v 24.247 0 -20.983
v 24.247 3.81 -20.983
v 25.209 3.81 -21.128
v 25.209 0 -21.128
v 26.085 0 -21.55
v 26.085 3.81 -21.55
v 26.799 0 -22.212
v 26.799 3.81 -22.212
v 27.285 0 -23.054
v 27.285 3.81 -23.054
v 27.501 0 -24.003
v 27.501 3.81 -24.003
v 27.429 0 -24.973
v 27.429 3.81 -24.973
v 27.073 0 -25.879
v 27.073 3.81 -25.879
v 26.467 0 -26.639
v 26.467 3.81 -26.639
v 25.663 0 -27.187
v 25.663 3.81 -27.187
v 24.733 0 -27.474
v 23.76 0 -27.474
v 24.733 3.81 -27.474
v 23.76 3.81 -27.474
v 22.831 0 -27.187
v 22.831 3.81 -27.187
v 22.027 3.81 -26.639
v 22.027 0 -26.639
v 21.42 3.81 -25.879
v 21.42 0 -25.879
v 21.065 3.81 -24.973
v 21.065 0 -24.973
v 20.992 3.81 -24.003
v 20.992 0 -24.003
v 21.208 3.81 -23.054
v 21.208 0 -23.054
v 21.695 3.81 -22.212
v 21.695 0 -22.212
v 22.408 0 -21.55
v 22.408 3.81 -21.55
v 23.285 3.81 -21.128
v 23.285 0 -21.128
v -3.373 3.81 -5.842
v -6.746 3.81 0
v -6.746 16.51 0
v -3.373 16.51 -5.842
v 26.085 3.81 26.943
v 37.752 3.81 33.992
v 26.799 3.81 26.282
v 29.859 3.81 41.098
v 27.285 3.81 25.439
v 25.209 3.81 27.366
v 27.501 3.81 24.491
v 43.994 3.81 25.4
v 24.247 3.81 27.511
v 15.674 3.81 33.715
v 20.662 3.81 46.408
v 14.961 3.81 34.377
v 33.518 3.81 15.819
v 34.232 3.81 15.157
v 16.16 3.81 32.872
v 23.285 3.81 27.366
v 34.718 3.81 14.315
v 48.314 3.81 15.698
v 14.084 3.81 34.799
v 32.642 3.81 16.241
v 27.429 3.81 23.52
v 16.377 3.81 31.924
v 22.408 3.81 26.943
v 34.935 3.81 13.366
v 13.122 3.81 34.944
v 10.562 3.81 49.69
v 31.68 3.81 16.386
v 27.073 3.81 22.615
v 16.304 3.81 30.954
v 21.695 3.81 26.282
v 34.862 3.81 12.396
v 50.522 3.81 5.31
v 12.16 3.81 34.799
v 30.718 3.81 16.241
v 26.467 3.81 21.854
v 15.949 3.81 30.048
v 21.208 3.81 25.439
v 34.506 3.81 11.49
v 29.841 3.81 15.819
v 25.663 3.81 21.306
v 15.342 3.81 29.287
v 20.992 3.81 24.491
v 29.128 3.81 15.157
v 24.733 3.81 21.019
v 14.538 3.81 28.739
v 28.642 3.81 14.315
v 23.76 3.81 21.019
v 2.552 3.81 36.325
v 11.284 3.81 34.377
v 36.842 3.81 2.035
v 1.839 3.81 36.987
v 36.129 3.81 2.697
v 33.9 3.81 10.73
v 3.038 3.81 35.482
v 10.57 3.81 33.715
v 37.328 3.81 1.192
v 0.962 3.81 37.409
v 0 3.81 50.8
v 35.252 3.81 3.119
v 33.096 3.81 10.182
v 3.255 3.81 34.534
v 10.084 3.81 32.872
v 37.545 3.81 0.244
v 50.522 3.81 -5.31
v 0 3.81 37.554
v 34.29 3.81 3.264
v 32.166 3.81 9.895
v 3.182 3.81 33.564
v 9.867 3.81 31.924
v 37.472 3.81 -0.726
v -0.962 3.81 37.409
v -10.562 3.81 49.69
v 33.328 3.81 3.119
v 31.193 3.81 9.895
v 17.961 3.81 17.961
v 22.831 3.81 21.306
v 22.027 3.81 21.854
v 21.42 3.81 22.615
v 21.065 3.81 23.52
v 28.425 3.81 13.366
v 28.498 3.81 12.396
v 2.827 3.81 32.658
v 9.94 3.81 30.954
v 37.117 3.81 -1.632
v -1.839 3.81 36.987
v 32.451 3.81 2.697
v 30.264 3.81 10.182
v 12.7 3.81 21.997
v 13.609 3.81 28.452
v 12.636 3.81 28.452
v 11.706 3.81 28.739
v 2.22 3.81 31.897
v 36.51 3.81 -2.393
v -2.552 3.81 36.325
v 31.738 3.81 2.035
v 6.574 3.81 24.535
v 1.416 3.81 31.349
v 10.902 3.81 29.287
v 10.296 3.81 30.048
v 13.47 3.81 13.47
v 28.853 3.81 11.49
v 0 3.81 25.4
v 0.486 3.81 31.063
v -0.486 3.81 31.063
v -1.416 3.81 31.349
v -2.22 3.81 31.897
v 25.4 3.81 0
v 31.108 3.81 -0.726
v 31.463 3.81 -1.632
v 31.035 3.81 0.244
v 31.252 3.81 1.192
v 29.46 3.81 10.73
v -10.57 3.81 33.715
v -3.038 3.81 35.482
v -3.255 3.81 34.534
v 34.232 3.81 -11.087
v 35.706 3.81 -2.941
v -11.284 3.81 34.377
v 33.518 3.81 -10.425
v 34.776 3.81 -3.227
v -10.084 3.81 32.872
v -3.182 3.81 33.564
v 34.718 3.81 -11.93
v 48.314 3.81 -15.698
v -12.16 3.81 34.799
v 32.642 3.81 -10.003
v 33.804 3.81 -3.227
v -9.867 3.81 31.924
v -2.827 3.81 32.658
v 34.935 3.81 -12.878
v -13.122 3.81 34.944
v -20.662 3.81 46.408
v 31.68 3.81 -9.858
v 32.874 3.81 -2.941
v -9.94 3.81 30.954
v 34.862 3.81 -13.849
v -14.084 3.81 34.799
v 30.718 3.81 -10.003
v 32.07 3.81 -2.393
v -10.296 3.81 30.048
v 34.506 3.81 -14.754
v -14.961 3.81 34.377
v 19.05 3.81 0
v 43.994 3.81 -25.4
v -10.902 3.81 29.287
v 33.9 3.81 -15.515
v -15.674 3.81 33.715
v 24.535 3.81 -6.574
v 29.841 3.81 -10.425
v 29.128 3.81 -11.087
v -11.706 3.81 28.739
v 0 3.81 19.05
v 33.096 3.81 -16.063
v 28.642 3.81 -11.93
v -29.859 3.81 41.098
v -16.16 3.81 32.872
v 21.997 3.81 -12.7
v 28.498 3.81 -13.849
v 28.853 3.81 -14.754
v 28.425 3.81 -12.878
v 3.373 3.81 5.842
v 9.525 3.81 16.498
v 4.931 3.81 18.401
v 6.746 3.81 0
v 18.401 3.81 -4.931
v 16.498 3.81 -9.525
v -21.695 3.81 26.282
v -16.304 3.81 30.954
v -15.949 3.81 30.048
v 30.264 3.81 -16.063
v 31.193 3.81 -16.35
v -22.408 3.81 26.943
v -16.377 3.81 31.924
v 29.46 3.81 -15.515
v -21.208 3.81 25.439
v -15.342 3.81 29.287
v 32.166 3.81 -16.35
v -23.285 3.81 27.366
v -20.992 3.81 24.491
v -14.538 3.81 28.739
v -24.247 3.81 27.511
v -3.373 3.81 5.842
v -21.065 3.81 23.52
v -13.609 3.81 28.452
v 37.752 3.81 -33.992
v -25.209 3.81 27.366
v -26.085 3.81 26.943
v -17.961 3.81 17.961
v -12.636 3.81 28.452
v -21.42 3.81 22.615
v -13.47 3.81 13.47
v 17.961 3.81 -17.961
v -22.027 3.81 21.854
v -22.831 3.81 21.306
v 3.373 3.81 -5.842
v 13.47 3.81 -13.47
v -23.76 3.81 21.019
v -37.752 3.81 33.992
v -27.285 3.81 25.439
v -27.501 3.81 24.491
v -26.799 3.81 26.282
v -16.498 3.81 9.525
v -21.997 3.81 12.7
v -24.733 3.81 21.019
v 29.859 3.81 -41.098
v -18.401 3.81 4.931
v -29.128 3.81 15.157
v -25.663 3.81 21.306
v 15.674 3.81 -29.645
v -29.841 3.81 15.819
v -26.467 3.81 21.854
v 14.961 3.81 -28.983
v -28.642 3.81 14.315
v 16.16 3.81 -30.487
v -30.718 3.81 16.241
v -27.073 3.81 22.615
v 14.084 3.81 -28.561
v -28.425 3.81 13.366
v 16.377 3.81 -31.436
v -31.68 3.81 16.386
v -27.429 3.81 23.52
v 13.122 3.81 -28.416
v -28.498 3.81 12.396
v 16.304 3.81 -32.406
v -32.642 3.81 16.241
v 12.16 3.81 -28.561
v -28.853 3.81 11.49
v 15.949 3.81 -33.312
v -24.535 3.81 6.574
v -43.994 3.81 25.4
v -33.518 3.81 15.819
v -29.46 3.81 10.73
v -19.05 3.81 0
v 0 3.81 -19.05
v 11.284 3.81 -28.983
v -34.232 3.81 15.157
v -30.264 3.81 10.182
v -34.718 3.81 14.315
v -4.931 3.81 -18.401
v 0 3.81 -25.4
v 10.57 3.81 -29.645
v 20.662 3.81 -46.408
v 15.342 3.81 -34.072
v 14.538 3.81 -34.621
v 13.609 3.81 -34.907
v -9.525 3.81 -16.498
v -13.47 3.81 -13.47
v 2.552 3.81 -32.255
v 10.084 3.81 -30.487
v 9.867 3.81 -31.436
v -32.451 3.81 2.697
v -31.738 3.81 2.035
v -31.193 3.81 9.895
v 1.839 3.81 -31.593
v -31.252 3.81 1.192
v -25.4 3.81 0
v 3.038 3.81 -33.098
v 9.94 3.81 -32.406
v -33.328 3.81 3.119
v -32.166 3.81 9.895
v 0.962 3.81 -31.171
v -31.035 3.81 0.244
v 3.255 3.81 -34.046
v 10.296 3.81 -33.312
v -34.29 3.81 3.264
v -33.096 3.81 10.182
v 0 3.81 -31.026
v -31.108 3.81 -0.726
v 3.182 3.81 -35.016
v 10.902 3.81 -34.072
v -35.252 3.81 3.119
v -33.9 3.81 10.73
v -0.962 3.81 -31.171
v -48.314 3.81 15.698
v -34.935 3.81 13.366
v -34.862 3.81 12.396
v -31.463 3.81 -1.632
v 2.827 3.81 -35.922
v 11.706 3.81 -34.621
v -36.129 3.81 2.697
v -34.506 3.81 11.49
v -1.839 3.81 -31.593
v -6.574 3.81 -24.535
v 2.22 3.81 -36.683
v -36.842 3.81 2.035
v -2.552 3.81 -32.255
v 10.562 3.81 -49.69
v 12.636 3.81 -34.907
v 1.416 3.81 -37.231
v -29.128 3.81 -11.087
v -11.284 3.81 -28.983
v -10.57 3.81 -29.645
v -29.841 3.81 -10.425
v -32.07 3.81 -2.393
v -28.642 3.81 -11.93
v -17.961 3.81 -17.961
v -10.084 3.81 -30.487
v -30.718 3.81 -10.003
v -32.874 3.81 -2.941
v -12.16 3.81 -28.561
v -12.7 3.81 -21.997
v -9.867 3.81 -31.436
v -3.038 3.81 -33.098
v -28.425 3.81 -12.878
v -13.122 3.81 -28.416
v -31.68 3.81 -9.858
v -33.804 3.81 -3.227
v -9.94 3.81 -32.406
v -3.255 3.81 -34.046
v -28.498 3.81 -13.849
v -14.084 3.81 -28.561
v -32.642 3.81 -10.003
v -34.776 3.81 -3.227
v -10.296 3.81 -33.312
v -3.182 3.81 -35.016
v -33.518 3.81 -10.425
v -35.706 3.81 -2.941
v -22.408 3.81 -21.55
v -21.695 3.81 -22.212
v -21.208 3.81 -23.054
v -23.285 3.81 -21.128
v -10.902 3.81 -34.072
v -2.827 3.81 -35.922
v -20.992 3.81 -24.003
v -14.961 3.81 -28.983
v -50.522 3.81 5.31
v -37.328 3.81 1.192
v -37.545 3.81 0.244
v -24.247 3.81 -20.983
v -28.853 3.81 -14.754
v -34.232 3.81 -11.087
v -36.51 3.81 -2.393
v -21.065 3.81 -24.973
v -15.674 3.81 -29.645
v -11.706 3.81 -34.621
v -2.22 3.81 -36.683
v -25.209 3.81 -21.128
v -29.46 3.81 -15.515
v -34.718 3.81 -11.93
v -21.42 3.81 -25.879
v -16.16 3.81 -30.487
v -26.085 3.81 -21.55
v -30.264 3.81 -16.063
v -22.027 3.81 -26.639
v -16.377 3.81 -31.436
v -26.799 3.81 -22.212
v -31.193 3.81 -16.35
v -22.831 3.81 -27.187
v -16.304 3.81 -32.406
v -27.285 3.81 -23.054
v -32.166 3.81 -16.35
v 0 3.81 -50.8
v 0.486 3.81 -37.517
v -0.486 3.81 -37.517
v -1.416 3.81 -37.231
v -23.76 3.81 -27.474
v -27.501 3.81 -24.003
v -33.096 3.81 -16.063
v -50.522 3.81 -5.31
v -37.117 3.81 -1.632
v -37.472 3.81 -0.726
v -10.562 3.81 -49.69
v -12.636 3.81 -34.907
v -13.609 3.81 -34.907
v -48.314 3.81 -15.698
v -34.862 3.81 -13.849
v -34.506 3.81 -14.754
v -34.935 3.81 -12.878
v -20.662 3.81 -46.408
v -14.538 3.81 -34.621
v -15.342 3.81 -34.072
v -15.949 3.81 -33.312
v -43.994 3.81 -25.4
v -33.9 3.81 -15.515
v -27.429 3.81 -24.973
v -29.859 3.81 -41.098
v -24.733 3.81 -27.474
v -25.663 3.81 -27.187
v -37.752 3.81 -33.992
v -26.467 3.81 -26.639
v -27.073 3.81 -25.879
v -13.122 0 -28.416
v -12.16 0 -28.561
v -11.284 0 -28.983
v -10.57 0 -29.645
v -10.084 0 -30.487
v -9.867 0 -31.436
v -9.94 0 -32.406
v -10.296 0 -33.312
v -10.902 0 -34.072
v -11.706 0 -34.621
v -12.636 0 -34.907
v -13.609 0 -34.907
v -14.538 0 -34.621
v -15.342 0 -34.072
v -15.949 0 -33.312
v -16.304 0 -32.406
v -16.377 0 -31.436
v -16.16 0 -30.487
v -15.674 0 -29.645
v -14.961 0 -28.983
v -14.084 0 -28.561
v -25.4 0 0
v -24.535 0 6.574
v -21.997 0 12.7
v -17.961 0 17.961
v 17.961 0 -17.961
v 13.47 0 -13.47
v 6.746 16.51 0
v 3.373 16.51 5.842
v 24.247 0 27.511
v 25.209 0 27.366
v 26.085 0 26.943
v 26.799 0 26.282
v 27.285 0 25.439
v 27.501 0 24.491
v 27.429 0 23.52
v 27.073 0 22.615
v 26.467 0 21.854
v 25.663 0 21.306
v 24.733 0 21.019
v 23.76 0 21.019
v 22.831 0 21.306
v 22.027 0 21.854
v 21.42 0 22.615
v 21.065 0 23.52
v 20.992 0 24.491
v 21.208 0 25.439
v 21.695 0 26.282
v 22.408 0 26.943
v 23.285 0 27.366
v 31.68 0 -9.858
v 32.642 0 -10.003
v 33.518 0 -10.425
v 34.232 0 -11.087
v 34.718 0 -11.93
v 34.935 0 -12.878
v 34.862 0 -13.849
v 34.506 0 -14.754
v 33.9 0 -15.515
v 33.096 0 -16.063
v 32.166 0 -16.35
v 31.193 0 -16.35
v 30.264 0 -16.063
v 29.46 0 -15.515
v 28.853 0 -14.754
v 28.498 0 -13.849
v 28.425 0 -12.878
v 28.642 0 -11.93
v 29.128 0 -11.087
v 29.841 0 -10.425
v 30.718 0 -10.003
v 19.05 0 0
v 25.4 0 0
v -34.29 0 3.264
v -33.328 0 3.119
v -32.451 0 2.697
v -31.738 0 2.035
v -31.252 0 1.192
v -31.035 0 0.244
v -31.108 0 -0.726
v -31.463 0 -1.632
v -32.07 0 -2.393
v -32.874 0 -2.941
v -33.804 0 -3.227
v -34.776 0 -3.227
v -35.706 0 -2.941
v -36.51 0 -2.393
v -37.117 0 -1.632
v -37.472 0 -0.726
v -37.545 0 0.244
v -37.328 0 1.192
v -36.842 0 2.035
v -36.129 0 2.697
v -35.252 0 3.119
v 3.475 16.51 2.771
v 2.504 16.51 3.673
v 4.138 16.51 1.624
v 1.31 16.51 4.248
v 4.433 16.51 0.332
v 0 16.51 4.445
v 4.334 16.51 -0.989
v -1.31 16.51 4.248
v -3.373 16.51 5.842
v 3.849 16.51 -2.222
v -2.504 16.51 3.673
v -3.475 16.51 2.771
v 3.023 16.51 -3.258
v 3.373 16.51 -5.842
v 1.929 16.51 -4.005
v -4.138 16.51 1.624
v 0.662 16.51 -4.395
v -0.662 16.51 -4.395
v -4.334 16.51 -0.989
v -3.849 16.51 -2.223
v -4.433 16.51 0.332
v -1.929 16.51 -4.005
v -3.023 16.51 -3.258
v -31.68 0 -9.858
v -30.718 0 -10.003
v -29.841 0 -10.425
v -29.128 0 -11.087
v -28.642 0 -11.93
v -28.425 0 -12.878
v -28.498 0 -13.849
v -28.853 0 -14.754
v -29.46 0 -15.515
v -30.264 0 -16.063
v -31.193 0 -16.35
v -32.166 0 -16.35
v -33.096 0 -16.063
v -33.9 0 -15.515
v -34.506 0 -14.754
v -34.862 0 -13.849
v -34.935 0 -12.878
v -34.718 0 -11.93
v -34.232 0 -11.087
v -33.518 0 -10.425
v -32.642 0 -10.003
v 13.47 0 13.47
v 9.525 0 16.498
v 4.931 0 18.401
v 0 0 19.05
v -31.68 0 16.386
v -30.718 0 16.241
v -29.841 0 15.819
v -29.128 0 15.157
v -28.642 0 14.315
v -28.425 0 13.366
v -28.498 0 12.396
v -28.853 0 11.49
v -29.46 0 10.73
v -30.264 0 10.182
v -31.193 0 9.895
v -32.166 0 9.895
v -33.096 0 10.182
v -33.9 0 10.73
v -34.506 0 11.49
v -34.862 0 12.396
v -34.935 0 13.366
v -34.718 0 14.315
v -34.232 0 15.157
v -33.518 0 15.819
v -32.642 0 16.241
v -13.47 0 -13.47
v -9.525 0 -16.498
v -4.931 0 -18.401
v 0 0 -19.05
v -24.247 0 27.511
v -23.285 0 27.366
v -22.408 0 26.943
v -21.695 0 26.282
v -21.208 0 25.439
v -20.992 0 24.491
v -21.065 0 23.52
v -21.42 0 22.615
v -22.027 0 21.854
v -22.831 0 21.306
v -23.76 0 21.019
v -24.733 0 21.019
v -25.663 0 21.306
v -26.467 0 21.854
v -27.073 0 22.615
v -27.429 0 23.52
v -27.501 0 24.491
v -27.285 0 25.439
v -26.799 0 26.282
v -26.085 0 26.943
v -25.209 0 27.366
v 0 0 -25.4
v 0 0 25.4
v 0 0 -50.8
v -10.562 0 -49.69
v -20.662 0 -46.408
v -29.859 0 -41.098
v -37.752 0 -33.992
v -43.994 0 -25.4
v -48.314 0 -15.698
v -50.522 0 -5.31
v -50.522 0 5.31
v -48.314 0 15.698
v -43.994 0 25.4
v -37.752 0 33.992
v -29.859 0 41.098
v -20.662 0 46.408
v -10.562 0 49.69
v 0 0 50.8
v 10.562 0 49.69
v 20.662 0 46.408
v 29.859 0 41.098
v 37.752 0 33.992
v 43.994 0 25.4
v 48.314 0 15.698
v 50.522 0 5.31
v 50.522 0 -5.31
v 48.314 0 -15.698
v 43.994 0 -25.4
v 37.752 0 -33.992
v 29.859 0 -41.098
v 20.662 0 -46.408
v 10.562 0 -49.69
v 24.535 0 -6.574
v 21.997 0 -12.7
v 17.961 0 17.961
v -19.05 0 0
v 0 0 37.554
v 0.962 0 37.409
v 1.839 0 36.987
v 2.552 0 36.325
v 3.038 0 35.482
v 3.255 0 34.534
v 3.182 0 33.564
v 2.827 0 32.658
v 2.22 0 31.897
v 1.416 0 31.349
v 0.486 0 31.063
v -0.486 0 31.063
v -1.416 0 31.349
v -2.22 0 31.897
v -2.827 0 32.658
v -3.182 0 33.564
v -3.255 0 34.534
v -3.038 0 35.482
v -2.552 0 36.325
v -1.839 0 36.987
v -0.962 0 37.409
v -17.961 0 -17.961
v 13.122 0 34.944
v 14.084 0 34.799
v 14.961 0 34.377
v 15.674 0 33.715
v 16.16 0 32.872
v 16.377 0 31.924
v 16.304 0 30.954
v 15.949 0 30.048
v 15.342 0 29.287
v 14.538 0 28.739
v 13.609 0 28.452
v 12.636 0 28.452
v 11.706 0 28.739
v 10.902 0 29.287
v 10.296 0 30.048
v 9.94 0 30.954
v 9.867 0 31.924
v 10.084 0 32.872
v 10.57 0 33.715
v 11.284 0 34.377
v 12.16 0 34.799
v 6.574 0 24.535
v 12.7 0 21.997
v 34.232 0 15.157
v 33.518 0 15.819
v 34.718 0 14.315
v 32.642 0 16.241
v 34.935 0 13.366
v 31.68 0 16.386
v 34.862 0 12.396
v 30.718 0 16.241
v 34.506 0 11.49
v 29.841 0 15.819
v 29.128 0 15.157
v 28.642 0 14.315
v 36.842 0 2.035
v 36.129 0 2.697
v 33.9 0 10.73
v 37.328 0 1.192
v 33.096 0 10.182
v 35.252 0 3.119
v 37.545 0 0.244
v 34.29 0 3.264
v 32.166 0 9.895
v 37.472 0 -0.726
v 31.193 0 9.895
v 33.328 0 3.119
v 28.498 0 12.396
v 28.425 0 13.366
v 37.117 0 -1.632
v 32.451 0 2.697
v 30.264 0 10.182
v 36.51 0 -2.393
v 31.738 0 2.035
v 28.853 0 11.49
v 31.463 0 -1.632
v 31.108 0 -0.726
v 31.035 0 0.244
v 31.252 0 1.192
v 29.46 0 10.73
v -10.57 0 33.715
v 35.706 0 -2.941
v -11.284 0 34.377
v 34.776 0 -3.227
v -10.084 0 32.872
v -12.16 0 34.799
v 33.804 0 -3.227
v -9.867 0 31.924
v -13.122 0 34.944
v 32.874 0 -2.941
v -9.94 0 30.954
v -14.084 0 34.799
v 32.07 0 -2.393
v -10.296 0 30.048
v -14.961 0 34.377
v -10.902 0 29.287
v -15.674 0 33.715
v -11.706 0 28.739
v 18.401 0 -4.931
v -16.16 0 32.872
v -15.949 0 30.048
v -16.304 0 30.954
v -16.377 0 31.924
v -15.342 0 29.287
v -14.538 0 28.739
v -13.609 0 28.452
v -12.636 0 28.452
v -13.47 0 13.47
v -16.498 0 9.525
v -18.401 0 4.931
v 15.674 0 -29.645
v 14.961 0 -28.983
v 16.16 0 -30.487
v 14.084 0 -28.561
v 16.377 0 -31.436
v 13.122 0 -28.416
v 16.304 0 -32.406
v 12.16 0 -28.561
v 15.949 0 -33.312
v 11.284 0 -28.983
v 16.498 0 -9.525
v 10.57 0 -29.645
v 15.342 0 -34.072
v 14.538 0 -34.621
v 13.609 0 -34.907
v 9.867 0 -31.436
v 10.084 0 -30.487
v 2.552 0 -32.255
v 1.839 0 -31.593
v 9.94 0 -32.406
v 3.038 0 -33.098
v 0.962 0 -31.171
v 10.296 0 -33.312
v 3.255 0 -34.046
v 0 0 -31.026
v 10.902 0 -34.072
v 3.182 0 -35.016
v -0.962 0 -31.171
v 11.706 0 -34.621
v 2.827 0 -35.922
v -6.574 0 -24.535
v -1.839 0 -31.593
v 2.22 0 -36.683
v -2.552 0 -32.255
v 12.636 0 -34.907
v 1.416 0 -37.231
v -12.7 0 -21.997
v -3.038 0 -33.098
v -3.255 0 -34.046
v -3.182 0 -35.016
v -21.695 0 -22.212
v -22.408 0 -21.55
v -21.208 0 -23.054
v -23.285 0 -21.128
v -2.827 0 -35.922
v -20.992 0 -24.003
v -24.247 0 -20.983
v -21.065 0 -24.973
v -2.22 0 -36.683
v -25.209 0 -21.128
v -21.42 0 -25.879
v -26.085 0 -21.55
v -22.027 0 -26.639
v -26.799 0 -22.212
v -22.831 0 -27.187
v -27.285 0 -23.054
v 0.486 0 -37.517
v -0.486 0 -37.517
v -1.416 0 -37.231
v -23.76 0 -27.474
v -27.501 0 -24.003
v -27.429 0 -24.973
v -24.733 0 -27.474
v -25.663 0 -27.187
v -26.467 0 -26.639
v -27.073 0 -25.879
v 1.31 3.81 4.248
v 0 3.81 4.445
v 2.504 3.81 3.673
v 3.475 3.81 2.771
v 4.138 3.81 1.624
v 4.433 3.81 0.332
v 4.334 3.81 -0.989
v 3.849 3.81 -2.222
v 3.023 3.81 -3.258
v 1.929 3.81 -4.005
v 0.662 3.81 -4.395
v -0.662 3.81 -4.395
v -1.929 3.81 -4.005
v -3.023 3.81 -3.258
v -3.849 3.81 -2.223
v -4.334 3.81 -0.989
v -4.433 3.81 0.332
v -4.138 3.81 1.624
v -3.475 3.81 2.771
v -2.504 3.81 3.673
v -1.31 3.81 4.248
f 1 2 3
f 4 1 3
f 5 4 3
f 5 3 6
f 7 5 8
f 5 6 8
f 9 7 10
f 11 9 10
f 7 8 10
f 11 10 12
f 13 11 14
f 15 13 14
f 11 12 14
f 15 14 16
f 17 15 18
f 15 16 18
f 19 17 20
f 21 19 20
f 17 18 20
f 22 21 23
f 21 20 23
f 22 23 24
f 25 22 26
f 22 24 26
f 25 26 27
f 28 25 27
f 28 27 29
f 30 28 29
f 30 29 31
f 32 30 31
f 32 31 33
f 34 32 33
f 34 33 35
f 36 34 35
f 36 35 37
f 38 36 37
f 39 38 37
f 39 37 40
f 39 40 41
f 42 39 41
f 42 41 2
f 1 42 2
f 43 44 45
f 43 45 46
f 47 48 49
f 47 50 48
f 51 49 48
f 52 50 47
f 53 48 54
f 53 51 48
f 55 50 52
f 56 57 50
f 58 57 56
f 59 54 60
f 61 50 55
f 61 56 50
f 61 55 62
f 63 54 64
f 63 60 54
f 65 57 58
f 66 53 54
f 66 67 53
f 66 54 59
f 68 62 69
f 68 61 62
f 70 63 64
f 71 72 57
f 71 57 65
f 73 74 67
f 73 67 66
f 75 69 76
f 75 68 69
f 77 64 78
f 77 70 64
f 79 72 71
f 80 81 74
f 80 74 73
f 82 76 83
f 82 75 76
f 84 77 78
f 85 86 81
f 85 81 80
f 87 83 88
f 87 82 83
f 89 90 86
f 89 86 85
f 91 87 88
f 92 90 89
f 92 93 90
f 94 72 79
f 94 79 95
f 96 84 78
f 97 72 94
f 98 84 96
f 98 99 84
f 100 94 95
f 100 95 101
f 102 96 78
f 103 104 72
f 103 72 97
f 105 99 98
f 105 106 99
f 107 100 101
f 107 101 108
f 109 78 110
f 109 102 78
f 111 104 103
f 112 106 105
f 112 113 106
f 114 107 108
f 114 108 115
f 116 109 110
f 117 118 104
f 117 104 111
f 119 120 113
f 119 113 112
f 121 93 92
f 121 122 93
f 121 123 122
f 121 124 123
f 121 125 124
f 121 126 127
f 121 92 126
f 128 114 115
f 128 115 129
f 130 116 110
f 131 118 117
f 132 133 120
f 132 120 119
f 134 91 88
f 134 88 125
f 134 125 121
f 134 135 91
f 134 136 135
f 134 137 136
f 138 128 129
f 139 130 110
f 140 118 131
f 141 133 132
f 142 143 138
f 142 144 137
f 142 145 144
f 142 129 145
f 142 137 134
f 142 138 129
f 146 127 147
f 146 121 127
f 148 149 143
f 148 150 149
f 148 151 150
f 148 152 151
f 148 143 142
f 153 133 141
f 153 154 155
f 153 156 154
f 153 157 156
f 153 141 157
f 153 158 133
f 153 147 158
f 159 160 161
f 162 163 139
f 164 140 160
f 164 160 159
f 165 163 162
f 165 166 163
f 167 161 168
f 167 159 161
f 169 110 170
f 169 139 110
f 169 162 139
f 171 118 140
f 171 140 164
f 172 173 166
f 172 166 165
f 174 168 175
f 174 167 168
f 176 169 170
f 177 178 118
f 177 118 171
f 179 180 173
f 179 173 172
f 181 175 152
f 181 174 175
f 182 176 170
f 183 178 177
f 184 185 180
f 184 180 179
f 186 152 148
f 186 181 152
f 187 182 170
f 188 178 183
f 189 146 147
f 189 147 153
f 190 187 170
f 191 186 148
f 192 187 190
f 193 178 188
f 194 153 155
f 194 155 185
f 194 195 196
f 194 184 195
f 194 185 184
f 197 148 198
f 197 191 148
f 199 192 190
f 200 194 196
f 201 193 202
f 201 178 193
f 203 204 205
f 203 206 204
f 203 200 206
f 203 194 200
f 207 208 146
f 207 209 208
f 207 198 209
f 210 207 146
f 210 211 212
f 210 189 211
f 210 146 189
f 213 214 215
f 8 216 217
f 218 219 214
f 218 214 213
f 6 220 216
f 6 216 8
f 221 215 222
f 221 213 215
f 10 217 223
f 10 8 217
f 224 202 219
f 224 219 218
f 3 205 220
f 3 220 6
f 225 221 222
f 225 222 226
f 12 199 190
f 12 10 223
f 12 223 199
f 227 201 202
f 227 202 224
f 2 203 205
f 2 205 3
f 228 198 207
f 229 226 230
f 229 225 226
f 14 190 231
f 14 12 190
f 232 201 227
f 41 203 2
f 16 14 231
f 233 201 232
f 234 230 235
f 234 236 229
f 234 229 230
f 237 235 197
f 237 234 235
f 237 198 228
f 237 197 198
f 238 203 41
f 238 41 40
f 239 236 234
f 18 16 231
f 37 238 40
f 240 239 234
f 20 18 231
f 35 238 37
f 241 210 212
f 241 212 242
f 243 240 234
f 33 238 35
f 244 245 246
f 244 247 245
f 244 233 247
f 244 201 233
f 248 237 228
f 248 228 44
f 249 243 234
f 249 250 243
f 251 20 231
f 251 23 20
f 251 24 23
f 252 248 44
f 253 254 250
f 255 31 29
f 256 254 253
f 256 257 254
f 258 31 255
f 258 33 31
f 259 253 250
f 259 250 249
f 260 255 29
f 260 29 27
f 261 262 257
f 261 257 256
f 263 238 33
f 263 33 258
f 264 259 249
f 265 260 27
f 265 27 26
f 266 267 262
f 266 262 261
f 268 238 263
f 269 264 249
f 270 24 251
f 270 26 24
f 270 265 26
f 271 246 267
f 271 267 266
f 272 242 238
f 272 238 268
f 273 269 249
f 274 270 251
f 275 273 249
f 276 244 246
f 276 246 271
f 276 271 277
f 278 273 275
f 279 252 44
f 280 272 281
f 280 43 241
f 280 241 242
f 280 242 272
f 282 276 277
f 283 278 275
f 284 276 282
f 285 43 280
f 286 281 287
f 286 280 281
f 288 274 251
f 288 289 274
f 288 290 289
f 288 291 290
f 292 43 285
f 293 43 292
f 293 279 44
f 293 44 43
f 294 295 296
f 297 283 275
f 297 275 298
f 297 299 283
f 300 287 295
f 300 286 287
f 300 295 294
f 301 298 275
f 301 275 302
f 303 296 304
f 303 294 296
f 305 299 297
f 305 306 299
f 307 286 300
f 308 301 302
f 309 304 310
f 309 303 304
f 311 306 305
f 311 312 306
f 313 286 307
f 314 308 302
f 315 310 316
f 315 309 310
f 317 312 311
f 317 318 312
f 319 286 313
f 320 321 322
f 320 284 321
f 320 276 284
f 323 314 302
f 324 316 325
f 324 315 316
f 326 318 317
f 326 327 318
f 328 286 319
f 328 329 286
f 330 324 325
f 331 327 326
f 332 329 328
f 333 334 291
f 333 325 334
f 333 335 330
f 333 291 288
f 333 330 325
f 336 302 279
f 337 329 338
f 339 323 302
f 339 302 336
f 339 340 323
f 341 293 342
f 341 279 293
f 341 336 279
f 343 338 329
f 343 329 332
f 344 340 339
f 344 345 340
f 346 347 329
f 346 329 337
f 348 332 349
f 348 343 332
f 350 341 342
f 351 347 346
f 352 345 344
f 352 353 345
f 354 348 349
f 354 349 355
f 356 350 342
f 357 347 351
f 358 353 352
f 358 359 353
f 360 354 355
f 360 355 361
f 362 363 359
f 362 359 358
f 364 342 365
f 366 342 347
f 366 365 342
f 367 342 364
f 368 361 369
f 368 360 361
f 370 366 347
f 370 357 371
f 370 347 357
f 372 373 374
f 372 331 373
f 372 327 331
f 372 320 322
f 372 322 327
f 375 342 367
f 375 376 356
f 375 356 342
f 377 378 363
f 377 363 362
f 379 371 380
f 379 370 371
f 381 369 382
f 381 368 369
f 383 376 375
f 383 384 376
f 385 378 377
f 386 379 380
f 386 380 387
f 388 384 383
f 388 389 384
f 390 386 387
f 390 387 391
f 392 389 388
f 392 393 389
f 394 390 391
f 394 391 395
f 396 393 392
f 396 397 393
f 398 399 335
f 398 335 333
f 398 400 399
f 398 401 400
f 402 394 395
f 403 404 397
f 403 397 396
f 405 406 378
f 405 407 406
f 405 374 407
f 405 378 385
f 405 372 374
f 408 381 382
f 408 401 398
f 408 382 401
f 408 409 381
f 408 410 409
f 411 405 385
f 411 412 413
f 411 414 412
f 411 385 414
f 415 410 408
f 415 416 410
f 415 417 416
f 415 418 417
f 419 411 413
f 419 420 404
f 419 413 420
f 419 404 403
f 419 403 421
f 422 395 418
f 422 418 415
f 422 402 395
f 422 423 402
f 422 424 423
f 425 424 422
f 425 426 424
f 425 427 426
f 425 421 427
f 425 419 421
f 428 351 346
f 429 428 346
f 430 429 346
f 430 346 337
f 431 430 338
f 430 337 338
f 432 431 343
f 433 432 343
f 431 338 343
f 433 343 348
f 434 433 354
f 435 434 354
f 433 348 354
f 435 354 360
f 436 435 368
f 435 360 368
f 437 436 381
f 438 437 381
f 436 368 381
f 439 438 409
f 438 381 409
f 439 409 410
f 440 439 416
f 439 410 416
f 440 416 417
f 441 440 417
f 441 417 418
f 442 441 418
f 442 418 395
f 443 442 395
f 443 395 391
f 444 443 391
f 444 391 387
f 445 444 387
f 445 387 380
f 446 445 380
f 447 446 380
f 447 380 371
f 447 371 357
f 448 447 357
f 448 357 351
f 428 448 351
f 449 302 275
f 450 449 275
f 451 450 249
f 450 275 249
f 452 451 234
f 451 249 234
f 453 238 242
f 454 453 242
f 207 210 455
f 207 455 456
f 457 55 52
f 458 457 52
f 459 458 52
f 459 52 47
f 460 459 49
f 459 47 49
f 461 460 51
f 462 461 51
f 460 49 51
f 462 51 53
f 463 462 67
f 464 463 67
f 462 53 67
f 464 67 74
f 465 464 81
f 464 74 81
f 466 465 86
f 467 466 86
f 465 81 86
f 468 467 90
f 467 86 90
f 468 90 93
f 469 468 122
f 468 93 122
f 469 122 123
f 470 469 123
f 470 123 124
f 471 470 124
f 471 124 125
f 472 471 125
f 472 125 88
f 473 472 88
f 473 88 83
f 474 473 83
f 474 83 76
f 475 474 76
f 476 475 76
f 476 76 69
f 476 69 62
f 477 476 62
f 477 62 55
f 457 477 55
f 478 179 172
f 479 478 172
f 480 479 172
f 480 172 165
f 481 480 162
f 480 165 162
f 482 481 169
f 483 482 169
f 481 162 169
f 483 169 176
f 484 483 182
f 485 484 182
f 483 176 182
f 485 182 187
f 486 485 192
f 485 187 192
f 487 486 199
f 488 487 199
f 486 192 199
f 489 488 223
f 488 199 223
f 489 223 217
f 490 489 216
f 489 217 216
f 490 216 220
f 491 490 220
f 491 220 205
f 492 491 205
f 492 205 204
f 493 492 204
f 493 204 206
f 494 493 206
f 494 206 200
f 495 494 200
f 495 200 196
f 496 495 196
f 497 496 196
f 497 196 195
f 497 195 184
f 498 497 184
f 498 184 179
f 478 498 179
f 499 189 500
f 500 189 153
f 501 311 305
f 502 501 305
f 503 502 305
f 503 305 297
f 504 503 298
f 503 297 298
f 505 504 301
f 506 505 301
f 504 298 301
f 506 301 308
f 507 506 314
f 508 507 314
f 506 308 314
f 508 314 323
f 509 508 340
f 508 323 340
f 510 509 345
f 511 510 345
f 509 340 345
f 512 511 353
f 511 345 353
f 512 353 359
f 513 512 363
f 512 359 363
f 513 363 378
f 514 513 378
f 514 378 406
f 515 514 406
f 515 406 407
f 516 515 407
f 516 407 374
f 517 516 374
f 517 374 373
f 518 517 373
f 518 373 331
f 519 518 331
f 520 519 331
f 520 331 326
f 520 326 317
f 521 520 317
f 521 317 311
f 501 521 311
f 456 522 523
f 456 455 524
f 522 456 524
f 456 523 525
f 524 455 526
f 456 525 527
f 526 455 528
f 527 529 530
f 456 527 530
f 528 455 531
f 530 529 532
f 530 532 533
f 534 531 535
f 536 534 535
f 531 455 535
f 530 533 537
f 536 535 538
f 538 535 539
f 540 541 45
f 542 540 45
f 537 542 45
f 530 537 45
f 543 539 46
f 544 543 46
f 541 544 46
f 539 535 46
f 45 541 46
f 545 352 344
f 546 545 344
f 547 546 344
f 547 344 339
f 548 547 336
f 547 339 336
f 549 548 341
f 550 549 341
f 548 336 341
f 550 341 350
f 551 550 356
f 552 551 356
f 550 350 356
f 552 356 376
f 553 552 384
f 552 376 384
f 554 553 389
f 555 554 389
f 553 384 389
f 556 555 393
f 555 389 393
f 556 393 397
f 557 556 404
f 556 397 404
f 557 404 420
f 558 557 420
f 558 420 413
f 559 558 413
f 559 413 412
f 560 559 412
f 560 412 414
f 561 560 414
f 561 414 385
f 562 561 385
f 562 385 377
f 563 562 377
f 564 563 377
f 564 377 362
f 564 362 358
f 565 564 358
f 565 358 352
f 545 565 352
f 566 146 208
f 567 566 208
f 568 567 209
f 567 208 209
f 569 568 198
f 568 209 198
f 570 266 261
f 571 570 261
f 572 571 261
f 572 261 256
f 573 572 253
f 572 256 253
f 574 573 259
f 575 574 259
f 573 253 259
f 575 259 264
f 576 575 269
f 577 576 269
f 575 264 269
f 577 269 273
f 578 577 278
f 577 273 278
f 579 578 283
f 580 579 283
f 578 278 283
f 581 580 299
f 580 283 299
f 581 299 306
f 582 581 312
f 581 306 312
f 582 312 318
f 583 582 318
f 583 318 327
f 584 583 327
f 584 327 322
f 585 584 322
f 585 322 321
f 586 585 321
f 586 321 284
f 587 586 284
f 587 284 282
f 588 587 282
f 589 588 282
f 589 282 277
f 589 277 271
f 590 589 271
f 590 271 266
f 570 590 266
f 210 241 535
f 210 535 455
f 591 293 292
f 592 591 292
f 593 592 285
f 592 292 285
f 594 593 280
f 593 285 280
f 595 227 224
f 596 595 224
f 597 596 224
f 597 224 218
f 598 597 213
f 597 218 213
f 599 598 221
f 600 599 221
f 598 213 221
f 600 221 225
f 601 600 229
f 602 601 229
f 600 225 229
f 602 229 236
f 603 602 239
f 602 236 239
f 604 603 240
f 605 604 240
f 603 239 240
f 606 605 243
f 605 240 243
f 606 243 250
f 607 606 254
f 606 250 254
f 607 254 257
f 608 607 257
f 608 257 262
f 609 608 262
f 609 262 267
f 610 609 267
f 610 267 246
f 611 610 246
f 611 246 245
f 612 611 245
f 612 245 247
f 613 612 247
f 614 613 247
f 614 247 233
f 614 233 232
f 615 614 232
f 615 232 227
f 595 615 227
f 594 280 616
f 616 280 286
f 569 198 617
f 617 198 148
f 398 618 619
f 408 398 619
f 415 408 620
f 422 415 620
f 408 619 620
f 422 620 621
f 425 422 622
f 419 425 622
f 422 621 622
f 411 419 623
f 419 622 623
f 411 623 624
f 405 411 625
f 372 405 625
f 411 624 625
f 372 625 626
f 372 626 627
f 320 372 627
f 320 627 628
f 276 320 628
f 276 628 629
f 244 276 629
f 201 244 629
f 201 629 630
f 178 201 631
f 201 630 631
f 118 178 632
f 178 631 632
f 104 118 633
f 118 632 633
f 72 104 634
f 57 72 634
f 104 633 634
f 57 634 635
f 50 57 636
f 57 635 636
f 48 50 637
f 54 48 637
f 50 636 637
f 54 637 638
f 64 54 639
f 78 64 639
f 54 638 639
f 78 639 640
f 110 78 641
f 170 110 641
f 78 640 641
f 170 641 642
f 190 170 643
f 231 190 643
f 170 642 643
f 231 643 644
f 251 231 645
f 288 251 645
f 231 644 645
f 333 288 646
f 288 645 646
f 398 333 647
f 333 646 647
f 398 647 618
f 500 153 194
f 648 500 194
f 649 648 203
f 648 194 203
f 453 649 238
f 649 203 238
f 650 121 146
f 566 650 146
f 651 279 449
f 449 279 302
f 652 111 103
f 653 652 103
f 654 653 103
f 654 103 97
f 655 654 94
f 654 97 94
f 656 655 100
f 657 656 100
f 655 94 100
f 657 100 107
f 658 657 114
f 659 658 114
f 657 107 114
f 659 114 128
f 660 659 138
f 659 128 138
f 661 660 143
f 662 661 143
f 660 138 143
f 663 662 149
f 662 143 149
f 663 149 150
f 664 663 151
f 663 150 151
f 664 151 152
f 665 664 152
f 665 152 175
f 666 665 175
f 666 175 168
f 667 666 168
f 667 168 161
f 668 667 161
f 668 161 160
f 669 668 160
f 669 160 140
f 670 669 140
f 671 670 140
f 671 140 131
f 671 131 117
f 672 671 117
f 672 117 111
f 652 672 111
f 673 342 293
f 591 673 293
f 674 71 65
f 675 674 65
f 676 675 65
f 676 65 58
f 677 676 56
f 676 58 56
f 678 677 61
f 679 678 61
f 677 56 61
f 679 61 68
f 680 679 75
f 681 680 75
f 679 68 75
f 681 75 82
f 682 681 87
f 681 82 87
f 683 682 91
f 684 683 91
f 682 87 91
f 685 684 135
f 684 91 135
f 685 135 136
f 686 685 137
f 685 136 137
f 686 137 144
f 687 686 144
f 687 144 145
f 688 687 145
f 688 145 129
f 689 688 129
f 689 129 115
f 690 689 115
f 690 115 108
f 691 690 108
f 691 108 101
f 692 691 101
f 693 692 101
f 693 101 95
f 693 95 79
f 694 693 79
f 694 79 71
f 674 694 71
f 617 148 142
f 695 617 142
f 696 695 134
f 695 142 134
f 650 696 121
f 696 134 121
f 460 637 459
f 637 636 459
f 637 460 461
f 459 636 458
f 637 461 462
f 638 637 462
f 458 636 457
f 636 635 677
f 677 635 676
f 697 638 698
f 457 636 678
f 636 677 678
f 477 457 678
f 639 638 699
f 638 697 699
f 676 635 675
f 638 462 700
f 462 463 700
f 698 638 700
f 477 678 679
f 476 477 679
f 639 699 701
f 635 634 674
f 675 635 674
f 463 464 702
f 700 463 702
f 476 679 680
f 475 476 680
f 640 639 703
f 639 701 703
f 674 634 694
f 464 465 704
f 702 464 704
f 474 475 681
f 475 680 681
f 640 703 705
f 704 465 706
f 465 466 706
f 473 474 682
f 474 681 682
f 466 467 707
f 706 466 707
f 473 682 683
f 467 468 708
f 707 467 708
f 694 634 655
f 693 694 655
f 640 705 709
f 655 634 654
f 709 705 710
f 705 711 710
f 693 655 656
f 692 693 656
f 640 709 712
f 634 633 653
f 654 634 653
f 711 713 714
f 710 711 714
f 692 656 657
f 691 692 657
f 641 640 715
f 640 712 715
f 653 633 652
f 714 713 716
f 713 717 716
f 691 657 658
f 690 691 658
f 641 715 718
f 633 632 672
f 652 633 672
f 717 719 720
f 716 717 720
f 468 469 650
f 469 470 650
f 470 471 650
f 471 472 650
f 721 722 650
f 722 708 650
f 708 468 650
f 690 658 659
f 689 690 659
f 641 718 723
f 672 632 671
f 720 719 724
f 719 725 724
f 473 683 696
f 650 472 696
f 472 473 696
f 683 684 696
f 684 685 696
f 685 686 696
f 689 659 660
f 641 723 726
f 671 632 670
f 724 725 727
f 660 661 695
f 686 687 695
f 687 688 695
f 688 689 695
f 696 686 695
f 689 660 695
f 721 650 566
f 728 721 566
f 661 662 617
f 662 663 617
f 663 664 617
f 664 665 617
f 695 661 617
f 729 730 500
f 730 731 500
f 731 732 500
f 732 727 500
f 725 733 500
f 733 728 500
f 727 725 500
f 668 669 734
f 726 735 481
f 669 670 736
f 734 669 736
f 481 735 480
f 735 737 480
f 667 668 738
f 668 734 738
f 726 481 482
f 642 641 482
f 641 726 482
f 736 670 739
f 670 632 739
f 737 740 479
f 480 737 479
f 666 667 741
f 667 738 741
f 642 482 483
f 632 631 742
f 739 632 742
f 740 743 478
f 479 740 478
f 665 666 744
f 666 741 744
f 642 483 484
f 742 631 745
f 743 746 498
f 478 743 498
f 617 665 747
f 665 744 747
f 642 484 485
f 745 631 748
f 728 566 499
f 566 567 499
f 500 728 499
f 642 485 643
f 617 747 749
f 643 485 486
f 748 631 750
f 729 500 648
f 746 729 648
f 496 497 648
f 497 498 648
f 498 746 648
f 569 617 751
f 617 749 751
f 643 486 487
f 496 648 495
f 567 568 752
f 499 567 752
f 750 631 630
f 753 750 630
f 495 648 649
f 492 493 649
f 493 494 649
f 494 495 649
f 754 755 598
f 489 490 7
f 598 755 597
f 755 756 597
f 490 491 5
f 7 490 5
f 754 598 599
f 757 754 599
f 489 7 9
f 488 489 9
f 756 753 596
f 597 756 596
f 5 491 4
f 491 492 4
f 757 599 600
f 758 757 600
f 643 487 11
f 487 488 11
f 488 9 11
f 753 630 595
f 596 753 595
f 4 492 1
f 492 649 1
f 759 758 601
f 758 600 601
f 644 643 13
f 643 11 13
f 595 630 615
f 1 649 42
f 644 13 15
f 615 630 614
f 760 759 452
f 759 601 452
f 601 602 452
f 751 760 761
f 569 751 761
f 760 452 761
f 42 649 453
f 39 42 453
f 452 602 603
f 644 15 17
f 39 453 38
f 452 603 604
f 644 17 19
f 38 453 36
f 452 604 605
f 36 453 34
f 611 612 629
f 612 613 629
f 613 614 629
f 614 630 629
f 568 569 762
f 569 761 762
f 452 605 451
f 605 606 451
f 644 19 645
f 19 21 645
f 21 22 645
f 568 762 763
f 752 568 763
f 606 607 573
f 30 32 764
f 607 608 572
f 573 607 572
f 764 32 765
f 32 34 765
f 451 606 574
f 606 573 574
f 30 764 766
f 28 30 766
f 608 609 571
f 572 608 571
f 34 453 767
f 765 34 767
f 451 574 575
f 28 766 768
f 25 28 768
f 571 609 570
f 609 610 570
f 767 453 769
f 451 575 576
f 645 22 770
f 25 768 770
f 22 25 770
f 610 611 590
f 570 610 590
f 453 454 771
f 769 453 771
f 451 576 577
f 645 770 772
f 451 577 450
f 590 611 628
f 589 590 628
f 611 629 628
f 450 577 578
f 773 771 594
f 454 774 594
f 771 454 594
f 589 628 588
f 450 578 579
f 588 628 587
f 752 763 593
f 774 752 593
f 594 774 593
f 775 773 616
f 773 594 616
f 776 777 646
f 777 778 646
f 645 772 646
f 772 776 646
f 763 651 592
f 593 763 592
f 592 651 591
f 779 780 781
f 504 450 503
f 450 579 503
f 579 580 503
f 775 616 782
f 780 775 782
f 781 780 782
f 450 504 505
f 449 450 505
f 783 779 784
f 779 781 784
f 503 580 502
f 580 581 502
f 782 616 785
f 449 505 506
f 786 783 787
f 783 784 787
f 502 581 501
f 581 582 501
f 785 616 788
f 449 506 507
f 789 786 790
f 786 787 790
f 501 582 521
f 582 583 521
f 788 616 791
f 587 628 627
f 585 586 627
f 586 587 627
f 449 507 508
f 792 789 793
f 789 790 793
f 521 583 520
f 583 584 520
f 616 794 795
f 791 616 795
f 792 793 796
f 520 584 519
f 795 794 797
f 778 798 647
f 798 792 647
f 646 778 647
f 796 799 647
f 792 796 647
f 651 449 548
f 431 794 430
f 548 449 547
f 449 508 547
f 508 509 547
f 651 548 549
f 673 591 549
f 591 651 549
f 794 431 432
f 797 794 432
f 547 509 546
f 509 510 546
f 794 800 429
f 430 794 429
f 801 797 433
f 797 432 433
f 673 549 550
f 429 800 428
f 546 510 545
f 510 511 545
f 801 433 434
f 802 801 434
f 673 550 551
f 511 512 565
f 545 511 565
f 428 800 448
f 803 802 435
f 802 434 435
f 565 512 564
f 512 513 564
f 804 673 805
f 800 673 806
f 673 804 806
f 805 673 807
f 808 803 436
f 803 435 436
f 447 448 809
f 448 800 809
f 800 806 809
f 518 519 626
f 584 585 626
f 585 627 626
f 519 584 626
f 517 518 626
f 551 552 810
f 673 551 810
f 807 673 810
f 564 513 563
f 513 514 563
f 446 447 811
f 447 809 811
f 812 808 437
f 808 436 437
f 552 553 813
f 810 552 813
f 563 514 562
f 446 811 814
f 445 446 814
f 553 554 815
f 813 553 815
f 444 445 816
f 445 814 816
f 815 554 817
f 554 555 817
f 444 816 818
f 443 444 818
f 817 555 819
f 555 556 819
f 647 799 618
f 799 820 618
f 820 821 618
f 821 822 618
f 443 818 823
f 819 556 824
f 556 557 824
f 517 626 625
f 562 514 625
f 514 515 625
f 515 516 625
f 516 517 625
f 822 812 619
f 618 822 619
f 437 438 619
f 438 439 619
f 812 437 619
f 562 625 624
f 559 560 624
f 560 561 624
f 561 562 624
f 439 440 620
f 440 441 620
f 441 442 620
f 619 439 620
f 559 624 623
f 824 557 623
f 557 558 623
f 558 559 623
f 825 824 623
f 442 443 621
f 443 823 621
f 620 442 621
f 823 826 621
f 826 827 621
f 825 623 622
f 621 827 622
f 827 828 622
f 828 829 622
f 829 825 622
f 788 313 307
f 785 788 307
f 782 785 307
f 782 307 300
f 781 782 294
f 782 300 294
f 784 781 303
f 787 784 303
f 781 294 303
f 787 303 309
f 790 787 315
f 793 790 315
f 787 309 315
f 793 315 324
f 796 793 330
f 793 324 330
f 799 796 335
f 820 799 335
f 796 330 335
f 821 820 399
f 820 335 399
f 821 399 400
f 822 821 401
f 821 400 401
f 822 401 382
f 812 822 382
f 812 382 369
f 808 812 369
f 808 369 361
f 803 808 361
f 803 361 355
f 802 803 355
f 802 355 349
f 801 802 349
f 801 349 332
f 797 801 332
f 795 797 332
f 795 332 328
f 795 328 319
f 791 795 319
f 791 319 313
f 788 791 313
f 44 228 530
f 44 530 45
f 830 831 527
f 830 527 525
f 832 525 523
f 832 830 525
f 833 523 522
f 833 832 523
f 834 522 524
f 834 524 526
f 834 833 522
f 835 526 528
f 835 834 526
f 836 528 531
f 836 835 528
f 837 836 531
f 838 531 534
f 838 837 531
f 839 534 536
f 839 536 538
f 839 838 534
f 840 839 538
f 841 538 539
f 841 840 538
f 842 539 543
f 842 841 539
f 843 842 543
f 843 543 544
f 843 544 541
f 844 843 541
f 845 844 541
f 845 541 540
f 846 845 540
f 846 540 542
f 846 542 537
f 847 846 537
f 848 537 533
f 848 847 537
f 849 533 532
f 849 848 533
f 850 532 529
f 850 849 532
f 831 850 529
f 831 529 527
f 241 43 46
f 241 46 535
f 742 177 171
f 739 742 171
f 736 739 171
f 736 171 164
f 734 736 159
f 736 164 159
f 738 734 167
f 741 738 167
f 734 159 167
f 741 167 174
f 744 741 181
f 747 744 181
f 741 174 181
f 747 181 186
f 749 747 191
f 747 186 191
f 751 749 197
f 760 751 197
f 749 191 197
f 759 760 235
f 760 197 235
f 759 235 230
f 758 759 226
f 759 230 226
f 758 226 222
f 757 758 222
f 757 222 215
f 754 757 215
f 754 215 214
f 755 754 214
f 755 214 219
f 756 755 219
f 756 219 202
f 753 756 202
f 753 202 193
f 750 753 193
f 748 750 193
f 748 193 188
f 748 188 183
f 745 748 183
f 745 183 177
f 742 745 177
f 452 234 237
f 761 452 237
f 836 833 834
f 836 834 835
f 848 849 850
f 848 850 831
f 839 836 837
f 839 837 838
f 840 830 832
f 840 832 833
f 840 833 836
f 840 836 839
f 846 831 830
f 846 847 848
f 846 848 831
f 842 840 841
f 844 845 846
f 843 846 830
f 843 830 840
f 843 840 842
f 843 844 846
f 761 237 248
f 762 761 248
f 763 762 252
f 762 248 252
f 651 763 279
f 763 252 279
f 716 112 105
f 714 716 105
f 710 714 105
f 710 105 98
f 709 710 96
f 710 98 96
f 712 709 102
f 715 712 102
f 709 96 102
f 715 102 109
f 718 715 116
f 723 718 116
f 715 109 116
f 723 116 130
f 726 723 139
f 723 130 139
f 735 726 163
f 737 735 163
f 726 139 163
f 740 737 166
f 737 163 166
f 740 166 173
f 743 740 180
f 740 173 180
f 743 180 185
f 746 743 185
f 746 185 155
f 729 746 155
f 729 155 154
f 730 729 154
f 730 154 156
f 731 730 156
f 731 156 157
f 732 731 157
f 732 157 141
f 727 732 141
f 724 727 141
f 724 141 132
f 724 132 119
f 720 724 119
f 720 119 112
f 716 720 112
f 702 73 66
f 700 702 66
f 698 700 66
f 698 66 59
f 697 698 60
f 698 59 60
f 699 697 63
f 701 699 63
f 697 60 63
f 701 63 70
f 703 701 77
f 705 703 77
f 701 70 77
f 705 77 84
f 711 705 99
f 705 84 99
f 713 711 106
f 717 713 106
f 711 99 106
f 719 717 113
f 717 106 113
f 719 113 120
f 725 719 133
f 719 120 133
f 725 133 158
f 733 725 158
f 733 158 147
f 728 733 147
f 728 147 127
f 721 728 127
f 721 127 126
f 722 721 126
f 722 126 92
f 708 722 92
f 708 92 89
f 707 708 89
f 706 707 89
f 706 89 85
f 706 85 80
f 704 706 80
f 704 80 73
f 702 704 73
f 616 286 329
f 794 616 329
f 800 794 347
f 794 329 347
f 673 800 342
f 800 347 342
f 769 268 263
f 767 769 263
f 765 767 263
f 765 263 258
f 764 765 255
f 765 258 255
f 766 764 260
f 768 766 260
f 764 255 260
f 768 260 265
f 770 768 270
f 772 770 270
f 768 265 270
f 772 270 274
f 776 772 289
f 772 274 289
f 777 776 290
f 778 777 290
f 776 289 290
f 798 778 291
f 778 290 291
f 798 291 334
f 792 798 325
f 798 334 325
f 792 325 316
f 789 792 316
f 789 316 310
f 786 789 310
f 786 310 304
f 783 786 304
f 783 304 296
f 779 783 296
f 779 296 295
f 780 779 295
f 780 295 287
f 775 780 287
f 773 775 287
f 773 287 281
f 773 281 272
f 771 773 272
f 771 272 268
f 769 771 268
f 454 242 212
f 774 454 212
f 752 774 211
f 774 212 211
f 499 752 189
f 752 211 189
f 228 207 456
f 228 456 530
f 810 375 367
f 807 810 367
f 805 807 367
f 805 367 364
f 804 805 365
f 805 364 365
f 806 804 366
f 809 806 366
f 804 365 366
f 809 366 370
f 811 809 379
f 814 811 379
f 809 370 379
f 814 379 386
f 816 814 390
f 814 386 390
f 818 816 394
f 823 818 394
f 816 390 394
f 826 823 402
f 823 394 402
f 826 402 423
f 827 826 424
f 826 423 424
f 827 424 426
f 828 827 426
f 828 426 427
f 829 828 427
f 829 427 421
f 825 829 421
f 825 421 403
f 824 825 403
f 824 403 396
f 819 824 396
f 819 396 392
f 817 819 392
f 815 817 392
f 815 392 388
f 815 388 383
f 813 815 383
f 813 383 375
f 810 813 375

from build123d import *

# Parameters (mm, degrees)
SKETCH1_R           = 50.8
BOSS_EXTRUDE1_DEPTH = 3.81
CUT_EXTRUDE1_DEPTH  = 72.943005914
SKETCH3_R           = 3.2639
CUT_EXTRUDE2_DEPTH  = 72.943005914
SKETCH4_R           = 4.445
BOSS_EXTRUDE2_DEPTH = 12.7


with BuildPart() as part:
    # Sketch1 → Boss-Extrude1 (new body)
    with BuildSketch(Plane(origin=(0, 0, 0), x_dir=(1, 0, 0), z_dir=(0, 1, 0))):
        with Locations(Location((0, 0, 0), (0, 0, 90))):
            Circle(SKETCH1_R)
    extrude(amount=BOSS_EXTRUDE1_DEPTH)

    # Sketch2 → Cut-Extrude1 (cut, through all)
    with BuildSketch(Plane(origin=(0, 3.81, 0), x_dir=(1, 0, 0), z_dir=(0, 1, 0))):
        with BuildLine():
            ThreePointArc((-13.470384182, 13.470384182), (-7.290119387, 17.599905094), (0, 19.05))
            Line((0, 19.05), (0, 25.4))
            ThreePointArc((0, 25.4), (-9.720159182, 23.466540126), (-17.960512242, 17.960512242))
            Line((-17.960512242, 17.960512242), (-13.470384182, 13.470384182))
        make_face()
        with BuildLine():
            Line((-17.960512242, -17.960512242), (-13.470384182, -13.470384182))
            ThreePointArc((-13.470384182, -13.470384182), (-17.599905094, -7.290119387), (-19.05, 0))
            Line((-19.05, 0), (-25.4, 0))
            ThreePointArc((-25.4, 0), (-23.466540126, -9.720159182), (-17.960512242, -17.960512242))
        make_face()
        with BuildLine():
            Line((17.960512242, -17.960512242), (13.470384182, -13.470384182))
            ThreePointArc((13.470384182, -13.470384182), (7.290119387, -17.599905094), (0, -19.05))
            Line((0, -19.05), (0, -25.4))
            ThreePointArc((0, -25.4), (9.720159182, -23.466540126), (17.960512242, -17.960512242))
        make_face()
        with BuildLine():
            Line((17.960512242, 17.960512242), (13.470384182, 13.470384182))
            ThreePointArc((13.470384182, 13.470384182), (17.599905094, 7.290119387), (19.05, 0))
            Line((19.05, 0), (25.4, 0))
            ThreePointArc((25.4, 0), (23.466540126, 9.720159182), (17.960512242, 17.960512242))
        make_face()
    extrude(amount=-CUT_EXTRUDE1_DEPTH, mode=Mode.SUBTRACT)

    # Sketch3 → Cut-Extrude2 (cut, through all)
    with BuildSketch(Plane(origin=(0, 3.81, 0), x_dir=(1, 0, 0), z_dir=(0, 1, 0))):
        with Locations(Location((13.122214896, 31.67982917, 0), (0, 0, 270))):
            Circle(SKETCH3_R)
        with Locations(Location((24.246691527, 24.246691527, 0), (0, 0, 270))):
            Circle(SKETCH3_R)
        with Locations(Location((31.67982917, 13.122214896, 0), (0, 0, 270))):
            Circle(SKETCH3_R)
        with Locations(Location((31.67982917, -13.122214896, 0), (0, 0, 270))):
            Circle(SKETCH3_R)
        with Locations(Location((24.246691527, -24.246691527, 0), (0, 0, 270))):
            Circle(SKETCH3_R)
        with Locations(Location((13.122214896, -31.67982917, 0), (0, 0, 270))):
            Circle(SKETCH3_R)
        with Locations(Location((0, -34.29, 0), (0, 0, 270))):
            Circle(SKETCH3_R)
        with Locations(Location((-13.122214896, -31.67982917, 0), (0, 0, 270))):
            Circle(SKETCH3_R)
        with Locations(Location((-24.246691527, -24.246691527, 0), (0, 0, 270))):
            Circle(SKETCH3_R)
        with Locations(Location((-31.67982917, -13.122214896, 0), (0, 0, 270))):
            Circle(SKETCH3_R)
        with Locations(Location((-34.29, 0, 0), (0, 0, 270))):
            Circle(SKETCH3_R)
        with Locations(Location((-31.67982917, 13.122214896, 0), (0, 0, 270))):
            Circle(SKETCH3_R)
        with Locations(Location((-24.246691527, 24.246691527, 0), (0, 0, 270))):
            Circle(SKETCH3_R)
        with Locations(Location((-13.122214896, 31.67982917, 0), (0, 0, 270))):
            Circle(SKETCH3_R)
        with Locations(Location((0, 34.29, 0), (0, 0, 270))):
            Circle(SKETCH3_R)
        with Locations(Location((34.29, 0, 0), (0, 0, 270))):
            Circle(SKETCH3_R)
    extrude(amount=-CUT_EXTRUDE2_DEPTH, mode=Mode.SUBTRACT)

    # Sketch4 → Boss-Extrude2 (add)
    with BuildSketch(Plane(origin=(0, 3.81, 0), x_dir=(1, 0, 0), z_dir=(0, 1, 0))):
        Polygon((-6.745760545, 0), (-3.372880273, 5.842), (3.372880273, 5.842), (6.745760545, 0), (3.372880273, -5.842), (-3.372880273, -5.842), align=None)
        with Locations(Location((0, 0, 0), (0, 0, 270))):
            Circle(SKETCH4_R, mode=Mode.SUBTRACT)
    extrude(amount=BOSS_EXTRUDE2_DEPTH)


solid = part.part
